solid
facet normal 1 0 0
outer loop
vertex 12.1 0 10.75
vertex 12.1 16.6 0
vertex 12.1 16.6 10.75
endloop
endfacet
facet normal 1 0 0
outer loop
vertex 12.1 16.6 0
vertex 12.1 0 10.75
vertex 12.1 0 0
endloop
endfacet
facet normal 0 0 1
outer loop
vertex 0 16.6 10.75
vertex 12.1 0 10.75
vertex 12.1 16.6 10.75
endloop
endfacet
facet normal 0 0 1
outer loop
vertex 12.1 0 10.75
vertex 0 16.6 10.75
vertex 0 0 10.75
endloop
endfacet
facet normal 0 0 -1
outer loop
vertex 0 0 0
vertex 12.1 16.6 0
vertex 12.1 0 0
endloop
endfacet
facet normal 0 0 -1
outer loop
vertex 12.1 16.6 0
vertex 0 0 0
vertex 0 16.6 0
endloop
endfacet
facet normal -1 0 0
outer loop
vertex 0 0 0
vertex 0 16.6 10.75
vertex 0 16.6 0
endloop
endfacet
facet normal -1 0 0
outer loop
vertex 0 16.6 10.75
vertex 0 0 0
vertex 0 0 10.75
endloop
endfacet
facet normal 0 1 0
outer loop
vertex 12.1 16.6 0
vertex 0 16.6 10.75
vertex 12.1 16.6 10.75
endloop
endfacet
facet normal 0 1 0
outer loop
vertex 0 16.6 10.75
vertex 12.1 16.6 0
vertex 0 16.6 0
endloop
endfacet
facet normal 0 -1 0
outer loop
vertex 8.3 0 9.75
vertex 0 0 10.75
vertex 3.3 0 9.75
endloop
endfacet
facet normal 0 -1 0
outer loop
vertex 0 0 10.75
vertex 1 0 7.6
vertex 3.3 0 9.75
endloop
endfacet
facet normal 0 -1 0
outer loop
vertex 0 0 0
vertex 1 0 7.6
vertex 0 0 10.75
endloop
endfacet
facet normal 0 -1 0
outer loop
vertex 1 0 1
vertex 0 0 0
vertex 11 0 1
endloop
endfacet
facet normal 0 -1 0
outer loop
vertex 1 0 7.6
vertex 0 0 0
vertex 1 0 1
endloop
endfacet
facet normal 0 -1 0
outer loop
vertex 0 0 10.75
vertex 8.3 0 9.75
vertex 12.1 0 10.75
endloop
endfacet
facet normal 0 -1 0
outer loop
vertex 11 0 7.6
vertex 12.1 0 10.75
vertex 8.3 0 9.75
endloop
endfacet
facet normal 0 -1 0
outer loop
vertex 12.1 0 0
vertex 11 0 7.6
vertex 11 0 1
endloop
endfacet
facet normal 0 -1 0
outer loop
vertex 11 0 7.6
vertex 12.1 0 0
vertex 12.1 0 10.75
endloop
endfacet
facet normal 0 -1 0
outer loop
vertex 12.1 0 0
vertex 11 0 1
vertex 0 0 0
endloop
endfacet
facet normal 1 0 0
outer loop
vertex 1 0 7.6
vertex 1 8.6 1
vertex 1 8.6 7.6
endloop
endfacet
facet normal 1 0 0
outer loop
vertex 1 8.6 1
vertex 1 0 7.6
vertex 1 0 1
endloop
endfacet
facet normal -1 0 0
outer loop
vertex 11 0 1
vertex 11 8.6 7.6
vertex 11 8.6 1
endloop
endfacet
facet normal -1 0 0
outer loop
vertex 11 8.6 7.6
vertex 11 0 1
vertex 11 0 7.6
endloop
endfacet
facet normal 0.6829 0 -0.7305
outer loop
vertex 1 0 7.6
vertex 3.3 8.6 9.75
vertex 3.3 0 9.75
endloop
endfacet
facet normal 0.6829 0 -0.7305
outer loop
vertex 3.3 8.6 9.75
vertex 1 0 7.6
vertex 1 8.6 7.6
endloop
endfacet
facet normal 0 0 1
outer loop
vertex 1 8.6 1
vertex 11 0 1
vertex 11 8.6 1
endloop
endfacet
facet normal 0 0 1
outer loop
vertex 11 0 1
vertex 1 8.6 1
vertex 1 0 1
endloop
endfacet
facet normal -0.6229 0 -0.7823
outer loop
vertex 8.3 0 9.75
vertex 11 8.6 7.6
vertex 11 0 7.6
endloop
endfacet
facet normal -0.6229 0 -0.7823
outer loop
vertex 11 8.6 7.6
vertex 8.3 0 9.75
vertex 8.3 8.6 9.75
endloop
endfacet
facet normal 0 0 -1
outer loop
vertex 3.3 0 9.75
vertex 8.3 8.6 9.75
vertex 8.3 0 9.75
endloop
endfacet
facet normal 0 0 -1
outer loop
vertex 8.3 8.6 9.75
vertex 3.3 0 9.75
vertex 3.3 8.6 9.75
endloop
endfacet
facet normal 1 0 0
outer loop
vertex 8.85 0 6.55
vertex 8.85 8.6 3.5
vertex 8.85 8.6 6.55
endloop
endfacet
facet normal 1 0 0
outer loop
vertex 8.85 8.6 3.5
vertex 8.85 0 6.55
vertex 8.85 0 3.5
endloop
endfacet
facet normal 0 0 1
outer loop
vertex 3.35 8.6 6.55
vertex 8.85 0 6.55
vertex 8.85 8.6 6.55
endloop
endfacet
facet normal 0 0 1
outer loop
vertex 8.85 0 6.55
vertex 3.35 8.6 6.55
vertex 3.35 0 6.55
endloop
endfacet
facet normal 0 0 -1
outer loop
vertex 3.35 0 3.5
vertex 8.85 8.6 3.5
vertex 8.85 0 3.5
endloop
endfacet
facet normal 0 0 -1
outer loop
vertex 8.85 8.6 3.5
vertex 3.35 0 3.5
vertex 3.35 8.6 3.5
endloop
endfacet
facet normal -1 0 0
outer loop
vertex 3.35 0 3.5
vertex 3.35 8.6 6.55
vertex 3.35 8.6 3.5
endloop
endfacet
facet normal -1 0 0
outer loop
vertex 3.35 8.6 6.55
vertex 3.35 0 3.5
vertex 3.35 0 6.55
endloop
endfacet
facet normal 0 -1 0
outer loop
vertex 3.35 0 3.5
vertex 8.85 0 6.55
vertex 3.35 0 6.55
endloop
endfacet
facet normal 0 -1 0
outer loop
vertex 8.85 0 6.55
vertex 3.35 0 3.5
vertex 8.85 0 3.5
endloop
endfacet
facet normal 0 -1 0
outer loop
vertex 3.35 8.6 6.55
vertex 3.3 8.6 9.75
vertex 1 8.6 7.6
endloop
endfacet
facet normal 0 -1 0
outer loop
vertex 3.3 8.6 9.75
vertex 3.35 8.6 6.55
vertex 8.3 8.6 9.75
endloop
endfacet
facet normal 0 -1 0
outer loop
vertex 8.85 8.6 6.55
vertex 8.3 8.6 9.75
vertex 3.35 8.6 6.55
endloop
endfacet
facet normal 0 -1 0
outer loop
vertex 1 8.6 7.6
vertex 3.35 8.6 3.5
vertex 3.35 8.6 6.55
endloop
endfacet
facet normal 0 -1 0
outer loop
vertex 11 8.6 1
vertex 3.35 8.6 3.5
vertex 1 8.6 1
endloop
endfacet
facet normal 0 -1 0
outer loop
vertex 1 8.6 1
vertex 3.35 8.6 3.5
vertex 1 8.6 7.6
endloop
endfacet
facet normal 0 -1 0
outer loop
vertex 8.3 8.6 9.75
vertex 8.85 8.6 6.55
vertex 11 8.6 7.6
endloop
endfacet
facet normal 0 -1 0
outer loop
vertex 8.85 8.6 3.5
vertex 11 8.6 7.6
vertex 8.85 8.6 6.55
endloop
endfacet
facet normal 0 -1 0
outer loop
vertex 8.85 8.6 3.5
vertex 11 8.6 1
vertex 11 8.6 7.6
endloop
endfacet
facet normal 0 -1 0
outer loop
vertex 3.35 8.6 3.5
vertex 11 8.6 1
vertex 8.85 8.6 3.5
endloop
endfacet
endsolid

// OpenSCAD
usb2();

module usb2(){


color("silver")
difference(){
cube([12.1,16.6,10.75]);



translate([1,-1,1])
rotate([90,0,0])
linear_extrude(40,center=true

){
polygon([
[0,0],
[10,0],
[10,6.6],
[7.3,8.75],
[2.3,8.75],
[0,6.6]
]);}}

color("white")
translate([6.1-2.75,0,3.5])
cube([5.5,16.6,3.05]);

translate([0,8.6,0])
cube([12.1,8,10.75]);
}
